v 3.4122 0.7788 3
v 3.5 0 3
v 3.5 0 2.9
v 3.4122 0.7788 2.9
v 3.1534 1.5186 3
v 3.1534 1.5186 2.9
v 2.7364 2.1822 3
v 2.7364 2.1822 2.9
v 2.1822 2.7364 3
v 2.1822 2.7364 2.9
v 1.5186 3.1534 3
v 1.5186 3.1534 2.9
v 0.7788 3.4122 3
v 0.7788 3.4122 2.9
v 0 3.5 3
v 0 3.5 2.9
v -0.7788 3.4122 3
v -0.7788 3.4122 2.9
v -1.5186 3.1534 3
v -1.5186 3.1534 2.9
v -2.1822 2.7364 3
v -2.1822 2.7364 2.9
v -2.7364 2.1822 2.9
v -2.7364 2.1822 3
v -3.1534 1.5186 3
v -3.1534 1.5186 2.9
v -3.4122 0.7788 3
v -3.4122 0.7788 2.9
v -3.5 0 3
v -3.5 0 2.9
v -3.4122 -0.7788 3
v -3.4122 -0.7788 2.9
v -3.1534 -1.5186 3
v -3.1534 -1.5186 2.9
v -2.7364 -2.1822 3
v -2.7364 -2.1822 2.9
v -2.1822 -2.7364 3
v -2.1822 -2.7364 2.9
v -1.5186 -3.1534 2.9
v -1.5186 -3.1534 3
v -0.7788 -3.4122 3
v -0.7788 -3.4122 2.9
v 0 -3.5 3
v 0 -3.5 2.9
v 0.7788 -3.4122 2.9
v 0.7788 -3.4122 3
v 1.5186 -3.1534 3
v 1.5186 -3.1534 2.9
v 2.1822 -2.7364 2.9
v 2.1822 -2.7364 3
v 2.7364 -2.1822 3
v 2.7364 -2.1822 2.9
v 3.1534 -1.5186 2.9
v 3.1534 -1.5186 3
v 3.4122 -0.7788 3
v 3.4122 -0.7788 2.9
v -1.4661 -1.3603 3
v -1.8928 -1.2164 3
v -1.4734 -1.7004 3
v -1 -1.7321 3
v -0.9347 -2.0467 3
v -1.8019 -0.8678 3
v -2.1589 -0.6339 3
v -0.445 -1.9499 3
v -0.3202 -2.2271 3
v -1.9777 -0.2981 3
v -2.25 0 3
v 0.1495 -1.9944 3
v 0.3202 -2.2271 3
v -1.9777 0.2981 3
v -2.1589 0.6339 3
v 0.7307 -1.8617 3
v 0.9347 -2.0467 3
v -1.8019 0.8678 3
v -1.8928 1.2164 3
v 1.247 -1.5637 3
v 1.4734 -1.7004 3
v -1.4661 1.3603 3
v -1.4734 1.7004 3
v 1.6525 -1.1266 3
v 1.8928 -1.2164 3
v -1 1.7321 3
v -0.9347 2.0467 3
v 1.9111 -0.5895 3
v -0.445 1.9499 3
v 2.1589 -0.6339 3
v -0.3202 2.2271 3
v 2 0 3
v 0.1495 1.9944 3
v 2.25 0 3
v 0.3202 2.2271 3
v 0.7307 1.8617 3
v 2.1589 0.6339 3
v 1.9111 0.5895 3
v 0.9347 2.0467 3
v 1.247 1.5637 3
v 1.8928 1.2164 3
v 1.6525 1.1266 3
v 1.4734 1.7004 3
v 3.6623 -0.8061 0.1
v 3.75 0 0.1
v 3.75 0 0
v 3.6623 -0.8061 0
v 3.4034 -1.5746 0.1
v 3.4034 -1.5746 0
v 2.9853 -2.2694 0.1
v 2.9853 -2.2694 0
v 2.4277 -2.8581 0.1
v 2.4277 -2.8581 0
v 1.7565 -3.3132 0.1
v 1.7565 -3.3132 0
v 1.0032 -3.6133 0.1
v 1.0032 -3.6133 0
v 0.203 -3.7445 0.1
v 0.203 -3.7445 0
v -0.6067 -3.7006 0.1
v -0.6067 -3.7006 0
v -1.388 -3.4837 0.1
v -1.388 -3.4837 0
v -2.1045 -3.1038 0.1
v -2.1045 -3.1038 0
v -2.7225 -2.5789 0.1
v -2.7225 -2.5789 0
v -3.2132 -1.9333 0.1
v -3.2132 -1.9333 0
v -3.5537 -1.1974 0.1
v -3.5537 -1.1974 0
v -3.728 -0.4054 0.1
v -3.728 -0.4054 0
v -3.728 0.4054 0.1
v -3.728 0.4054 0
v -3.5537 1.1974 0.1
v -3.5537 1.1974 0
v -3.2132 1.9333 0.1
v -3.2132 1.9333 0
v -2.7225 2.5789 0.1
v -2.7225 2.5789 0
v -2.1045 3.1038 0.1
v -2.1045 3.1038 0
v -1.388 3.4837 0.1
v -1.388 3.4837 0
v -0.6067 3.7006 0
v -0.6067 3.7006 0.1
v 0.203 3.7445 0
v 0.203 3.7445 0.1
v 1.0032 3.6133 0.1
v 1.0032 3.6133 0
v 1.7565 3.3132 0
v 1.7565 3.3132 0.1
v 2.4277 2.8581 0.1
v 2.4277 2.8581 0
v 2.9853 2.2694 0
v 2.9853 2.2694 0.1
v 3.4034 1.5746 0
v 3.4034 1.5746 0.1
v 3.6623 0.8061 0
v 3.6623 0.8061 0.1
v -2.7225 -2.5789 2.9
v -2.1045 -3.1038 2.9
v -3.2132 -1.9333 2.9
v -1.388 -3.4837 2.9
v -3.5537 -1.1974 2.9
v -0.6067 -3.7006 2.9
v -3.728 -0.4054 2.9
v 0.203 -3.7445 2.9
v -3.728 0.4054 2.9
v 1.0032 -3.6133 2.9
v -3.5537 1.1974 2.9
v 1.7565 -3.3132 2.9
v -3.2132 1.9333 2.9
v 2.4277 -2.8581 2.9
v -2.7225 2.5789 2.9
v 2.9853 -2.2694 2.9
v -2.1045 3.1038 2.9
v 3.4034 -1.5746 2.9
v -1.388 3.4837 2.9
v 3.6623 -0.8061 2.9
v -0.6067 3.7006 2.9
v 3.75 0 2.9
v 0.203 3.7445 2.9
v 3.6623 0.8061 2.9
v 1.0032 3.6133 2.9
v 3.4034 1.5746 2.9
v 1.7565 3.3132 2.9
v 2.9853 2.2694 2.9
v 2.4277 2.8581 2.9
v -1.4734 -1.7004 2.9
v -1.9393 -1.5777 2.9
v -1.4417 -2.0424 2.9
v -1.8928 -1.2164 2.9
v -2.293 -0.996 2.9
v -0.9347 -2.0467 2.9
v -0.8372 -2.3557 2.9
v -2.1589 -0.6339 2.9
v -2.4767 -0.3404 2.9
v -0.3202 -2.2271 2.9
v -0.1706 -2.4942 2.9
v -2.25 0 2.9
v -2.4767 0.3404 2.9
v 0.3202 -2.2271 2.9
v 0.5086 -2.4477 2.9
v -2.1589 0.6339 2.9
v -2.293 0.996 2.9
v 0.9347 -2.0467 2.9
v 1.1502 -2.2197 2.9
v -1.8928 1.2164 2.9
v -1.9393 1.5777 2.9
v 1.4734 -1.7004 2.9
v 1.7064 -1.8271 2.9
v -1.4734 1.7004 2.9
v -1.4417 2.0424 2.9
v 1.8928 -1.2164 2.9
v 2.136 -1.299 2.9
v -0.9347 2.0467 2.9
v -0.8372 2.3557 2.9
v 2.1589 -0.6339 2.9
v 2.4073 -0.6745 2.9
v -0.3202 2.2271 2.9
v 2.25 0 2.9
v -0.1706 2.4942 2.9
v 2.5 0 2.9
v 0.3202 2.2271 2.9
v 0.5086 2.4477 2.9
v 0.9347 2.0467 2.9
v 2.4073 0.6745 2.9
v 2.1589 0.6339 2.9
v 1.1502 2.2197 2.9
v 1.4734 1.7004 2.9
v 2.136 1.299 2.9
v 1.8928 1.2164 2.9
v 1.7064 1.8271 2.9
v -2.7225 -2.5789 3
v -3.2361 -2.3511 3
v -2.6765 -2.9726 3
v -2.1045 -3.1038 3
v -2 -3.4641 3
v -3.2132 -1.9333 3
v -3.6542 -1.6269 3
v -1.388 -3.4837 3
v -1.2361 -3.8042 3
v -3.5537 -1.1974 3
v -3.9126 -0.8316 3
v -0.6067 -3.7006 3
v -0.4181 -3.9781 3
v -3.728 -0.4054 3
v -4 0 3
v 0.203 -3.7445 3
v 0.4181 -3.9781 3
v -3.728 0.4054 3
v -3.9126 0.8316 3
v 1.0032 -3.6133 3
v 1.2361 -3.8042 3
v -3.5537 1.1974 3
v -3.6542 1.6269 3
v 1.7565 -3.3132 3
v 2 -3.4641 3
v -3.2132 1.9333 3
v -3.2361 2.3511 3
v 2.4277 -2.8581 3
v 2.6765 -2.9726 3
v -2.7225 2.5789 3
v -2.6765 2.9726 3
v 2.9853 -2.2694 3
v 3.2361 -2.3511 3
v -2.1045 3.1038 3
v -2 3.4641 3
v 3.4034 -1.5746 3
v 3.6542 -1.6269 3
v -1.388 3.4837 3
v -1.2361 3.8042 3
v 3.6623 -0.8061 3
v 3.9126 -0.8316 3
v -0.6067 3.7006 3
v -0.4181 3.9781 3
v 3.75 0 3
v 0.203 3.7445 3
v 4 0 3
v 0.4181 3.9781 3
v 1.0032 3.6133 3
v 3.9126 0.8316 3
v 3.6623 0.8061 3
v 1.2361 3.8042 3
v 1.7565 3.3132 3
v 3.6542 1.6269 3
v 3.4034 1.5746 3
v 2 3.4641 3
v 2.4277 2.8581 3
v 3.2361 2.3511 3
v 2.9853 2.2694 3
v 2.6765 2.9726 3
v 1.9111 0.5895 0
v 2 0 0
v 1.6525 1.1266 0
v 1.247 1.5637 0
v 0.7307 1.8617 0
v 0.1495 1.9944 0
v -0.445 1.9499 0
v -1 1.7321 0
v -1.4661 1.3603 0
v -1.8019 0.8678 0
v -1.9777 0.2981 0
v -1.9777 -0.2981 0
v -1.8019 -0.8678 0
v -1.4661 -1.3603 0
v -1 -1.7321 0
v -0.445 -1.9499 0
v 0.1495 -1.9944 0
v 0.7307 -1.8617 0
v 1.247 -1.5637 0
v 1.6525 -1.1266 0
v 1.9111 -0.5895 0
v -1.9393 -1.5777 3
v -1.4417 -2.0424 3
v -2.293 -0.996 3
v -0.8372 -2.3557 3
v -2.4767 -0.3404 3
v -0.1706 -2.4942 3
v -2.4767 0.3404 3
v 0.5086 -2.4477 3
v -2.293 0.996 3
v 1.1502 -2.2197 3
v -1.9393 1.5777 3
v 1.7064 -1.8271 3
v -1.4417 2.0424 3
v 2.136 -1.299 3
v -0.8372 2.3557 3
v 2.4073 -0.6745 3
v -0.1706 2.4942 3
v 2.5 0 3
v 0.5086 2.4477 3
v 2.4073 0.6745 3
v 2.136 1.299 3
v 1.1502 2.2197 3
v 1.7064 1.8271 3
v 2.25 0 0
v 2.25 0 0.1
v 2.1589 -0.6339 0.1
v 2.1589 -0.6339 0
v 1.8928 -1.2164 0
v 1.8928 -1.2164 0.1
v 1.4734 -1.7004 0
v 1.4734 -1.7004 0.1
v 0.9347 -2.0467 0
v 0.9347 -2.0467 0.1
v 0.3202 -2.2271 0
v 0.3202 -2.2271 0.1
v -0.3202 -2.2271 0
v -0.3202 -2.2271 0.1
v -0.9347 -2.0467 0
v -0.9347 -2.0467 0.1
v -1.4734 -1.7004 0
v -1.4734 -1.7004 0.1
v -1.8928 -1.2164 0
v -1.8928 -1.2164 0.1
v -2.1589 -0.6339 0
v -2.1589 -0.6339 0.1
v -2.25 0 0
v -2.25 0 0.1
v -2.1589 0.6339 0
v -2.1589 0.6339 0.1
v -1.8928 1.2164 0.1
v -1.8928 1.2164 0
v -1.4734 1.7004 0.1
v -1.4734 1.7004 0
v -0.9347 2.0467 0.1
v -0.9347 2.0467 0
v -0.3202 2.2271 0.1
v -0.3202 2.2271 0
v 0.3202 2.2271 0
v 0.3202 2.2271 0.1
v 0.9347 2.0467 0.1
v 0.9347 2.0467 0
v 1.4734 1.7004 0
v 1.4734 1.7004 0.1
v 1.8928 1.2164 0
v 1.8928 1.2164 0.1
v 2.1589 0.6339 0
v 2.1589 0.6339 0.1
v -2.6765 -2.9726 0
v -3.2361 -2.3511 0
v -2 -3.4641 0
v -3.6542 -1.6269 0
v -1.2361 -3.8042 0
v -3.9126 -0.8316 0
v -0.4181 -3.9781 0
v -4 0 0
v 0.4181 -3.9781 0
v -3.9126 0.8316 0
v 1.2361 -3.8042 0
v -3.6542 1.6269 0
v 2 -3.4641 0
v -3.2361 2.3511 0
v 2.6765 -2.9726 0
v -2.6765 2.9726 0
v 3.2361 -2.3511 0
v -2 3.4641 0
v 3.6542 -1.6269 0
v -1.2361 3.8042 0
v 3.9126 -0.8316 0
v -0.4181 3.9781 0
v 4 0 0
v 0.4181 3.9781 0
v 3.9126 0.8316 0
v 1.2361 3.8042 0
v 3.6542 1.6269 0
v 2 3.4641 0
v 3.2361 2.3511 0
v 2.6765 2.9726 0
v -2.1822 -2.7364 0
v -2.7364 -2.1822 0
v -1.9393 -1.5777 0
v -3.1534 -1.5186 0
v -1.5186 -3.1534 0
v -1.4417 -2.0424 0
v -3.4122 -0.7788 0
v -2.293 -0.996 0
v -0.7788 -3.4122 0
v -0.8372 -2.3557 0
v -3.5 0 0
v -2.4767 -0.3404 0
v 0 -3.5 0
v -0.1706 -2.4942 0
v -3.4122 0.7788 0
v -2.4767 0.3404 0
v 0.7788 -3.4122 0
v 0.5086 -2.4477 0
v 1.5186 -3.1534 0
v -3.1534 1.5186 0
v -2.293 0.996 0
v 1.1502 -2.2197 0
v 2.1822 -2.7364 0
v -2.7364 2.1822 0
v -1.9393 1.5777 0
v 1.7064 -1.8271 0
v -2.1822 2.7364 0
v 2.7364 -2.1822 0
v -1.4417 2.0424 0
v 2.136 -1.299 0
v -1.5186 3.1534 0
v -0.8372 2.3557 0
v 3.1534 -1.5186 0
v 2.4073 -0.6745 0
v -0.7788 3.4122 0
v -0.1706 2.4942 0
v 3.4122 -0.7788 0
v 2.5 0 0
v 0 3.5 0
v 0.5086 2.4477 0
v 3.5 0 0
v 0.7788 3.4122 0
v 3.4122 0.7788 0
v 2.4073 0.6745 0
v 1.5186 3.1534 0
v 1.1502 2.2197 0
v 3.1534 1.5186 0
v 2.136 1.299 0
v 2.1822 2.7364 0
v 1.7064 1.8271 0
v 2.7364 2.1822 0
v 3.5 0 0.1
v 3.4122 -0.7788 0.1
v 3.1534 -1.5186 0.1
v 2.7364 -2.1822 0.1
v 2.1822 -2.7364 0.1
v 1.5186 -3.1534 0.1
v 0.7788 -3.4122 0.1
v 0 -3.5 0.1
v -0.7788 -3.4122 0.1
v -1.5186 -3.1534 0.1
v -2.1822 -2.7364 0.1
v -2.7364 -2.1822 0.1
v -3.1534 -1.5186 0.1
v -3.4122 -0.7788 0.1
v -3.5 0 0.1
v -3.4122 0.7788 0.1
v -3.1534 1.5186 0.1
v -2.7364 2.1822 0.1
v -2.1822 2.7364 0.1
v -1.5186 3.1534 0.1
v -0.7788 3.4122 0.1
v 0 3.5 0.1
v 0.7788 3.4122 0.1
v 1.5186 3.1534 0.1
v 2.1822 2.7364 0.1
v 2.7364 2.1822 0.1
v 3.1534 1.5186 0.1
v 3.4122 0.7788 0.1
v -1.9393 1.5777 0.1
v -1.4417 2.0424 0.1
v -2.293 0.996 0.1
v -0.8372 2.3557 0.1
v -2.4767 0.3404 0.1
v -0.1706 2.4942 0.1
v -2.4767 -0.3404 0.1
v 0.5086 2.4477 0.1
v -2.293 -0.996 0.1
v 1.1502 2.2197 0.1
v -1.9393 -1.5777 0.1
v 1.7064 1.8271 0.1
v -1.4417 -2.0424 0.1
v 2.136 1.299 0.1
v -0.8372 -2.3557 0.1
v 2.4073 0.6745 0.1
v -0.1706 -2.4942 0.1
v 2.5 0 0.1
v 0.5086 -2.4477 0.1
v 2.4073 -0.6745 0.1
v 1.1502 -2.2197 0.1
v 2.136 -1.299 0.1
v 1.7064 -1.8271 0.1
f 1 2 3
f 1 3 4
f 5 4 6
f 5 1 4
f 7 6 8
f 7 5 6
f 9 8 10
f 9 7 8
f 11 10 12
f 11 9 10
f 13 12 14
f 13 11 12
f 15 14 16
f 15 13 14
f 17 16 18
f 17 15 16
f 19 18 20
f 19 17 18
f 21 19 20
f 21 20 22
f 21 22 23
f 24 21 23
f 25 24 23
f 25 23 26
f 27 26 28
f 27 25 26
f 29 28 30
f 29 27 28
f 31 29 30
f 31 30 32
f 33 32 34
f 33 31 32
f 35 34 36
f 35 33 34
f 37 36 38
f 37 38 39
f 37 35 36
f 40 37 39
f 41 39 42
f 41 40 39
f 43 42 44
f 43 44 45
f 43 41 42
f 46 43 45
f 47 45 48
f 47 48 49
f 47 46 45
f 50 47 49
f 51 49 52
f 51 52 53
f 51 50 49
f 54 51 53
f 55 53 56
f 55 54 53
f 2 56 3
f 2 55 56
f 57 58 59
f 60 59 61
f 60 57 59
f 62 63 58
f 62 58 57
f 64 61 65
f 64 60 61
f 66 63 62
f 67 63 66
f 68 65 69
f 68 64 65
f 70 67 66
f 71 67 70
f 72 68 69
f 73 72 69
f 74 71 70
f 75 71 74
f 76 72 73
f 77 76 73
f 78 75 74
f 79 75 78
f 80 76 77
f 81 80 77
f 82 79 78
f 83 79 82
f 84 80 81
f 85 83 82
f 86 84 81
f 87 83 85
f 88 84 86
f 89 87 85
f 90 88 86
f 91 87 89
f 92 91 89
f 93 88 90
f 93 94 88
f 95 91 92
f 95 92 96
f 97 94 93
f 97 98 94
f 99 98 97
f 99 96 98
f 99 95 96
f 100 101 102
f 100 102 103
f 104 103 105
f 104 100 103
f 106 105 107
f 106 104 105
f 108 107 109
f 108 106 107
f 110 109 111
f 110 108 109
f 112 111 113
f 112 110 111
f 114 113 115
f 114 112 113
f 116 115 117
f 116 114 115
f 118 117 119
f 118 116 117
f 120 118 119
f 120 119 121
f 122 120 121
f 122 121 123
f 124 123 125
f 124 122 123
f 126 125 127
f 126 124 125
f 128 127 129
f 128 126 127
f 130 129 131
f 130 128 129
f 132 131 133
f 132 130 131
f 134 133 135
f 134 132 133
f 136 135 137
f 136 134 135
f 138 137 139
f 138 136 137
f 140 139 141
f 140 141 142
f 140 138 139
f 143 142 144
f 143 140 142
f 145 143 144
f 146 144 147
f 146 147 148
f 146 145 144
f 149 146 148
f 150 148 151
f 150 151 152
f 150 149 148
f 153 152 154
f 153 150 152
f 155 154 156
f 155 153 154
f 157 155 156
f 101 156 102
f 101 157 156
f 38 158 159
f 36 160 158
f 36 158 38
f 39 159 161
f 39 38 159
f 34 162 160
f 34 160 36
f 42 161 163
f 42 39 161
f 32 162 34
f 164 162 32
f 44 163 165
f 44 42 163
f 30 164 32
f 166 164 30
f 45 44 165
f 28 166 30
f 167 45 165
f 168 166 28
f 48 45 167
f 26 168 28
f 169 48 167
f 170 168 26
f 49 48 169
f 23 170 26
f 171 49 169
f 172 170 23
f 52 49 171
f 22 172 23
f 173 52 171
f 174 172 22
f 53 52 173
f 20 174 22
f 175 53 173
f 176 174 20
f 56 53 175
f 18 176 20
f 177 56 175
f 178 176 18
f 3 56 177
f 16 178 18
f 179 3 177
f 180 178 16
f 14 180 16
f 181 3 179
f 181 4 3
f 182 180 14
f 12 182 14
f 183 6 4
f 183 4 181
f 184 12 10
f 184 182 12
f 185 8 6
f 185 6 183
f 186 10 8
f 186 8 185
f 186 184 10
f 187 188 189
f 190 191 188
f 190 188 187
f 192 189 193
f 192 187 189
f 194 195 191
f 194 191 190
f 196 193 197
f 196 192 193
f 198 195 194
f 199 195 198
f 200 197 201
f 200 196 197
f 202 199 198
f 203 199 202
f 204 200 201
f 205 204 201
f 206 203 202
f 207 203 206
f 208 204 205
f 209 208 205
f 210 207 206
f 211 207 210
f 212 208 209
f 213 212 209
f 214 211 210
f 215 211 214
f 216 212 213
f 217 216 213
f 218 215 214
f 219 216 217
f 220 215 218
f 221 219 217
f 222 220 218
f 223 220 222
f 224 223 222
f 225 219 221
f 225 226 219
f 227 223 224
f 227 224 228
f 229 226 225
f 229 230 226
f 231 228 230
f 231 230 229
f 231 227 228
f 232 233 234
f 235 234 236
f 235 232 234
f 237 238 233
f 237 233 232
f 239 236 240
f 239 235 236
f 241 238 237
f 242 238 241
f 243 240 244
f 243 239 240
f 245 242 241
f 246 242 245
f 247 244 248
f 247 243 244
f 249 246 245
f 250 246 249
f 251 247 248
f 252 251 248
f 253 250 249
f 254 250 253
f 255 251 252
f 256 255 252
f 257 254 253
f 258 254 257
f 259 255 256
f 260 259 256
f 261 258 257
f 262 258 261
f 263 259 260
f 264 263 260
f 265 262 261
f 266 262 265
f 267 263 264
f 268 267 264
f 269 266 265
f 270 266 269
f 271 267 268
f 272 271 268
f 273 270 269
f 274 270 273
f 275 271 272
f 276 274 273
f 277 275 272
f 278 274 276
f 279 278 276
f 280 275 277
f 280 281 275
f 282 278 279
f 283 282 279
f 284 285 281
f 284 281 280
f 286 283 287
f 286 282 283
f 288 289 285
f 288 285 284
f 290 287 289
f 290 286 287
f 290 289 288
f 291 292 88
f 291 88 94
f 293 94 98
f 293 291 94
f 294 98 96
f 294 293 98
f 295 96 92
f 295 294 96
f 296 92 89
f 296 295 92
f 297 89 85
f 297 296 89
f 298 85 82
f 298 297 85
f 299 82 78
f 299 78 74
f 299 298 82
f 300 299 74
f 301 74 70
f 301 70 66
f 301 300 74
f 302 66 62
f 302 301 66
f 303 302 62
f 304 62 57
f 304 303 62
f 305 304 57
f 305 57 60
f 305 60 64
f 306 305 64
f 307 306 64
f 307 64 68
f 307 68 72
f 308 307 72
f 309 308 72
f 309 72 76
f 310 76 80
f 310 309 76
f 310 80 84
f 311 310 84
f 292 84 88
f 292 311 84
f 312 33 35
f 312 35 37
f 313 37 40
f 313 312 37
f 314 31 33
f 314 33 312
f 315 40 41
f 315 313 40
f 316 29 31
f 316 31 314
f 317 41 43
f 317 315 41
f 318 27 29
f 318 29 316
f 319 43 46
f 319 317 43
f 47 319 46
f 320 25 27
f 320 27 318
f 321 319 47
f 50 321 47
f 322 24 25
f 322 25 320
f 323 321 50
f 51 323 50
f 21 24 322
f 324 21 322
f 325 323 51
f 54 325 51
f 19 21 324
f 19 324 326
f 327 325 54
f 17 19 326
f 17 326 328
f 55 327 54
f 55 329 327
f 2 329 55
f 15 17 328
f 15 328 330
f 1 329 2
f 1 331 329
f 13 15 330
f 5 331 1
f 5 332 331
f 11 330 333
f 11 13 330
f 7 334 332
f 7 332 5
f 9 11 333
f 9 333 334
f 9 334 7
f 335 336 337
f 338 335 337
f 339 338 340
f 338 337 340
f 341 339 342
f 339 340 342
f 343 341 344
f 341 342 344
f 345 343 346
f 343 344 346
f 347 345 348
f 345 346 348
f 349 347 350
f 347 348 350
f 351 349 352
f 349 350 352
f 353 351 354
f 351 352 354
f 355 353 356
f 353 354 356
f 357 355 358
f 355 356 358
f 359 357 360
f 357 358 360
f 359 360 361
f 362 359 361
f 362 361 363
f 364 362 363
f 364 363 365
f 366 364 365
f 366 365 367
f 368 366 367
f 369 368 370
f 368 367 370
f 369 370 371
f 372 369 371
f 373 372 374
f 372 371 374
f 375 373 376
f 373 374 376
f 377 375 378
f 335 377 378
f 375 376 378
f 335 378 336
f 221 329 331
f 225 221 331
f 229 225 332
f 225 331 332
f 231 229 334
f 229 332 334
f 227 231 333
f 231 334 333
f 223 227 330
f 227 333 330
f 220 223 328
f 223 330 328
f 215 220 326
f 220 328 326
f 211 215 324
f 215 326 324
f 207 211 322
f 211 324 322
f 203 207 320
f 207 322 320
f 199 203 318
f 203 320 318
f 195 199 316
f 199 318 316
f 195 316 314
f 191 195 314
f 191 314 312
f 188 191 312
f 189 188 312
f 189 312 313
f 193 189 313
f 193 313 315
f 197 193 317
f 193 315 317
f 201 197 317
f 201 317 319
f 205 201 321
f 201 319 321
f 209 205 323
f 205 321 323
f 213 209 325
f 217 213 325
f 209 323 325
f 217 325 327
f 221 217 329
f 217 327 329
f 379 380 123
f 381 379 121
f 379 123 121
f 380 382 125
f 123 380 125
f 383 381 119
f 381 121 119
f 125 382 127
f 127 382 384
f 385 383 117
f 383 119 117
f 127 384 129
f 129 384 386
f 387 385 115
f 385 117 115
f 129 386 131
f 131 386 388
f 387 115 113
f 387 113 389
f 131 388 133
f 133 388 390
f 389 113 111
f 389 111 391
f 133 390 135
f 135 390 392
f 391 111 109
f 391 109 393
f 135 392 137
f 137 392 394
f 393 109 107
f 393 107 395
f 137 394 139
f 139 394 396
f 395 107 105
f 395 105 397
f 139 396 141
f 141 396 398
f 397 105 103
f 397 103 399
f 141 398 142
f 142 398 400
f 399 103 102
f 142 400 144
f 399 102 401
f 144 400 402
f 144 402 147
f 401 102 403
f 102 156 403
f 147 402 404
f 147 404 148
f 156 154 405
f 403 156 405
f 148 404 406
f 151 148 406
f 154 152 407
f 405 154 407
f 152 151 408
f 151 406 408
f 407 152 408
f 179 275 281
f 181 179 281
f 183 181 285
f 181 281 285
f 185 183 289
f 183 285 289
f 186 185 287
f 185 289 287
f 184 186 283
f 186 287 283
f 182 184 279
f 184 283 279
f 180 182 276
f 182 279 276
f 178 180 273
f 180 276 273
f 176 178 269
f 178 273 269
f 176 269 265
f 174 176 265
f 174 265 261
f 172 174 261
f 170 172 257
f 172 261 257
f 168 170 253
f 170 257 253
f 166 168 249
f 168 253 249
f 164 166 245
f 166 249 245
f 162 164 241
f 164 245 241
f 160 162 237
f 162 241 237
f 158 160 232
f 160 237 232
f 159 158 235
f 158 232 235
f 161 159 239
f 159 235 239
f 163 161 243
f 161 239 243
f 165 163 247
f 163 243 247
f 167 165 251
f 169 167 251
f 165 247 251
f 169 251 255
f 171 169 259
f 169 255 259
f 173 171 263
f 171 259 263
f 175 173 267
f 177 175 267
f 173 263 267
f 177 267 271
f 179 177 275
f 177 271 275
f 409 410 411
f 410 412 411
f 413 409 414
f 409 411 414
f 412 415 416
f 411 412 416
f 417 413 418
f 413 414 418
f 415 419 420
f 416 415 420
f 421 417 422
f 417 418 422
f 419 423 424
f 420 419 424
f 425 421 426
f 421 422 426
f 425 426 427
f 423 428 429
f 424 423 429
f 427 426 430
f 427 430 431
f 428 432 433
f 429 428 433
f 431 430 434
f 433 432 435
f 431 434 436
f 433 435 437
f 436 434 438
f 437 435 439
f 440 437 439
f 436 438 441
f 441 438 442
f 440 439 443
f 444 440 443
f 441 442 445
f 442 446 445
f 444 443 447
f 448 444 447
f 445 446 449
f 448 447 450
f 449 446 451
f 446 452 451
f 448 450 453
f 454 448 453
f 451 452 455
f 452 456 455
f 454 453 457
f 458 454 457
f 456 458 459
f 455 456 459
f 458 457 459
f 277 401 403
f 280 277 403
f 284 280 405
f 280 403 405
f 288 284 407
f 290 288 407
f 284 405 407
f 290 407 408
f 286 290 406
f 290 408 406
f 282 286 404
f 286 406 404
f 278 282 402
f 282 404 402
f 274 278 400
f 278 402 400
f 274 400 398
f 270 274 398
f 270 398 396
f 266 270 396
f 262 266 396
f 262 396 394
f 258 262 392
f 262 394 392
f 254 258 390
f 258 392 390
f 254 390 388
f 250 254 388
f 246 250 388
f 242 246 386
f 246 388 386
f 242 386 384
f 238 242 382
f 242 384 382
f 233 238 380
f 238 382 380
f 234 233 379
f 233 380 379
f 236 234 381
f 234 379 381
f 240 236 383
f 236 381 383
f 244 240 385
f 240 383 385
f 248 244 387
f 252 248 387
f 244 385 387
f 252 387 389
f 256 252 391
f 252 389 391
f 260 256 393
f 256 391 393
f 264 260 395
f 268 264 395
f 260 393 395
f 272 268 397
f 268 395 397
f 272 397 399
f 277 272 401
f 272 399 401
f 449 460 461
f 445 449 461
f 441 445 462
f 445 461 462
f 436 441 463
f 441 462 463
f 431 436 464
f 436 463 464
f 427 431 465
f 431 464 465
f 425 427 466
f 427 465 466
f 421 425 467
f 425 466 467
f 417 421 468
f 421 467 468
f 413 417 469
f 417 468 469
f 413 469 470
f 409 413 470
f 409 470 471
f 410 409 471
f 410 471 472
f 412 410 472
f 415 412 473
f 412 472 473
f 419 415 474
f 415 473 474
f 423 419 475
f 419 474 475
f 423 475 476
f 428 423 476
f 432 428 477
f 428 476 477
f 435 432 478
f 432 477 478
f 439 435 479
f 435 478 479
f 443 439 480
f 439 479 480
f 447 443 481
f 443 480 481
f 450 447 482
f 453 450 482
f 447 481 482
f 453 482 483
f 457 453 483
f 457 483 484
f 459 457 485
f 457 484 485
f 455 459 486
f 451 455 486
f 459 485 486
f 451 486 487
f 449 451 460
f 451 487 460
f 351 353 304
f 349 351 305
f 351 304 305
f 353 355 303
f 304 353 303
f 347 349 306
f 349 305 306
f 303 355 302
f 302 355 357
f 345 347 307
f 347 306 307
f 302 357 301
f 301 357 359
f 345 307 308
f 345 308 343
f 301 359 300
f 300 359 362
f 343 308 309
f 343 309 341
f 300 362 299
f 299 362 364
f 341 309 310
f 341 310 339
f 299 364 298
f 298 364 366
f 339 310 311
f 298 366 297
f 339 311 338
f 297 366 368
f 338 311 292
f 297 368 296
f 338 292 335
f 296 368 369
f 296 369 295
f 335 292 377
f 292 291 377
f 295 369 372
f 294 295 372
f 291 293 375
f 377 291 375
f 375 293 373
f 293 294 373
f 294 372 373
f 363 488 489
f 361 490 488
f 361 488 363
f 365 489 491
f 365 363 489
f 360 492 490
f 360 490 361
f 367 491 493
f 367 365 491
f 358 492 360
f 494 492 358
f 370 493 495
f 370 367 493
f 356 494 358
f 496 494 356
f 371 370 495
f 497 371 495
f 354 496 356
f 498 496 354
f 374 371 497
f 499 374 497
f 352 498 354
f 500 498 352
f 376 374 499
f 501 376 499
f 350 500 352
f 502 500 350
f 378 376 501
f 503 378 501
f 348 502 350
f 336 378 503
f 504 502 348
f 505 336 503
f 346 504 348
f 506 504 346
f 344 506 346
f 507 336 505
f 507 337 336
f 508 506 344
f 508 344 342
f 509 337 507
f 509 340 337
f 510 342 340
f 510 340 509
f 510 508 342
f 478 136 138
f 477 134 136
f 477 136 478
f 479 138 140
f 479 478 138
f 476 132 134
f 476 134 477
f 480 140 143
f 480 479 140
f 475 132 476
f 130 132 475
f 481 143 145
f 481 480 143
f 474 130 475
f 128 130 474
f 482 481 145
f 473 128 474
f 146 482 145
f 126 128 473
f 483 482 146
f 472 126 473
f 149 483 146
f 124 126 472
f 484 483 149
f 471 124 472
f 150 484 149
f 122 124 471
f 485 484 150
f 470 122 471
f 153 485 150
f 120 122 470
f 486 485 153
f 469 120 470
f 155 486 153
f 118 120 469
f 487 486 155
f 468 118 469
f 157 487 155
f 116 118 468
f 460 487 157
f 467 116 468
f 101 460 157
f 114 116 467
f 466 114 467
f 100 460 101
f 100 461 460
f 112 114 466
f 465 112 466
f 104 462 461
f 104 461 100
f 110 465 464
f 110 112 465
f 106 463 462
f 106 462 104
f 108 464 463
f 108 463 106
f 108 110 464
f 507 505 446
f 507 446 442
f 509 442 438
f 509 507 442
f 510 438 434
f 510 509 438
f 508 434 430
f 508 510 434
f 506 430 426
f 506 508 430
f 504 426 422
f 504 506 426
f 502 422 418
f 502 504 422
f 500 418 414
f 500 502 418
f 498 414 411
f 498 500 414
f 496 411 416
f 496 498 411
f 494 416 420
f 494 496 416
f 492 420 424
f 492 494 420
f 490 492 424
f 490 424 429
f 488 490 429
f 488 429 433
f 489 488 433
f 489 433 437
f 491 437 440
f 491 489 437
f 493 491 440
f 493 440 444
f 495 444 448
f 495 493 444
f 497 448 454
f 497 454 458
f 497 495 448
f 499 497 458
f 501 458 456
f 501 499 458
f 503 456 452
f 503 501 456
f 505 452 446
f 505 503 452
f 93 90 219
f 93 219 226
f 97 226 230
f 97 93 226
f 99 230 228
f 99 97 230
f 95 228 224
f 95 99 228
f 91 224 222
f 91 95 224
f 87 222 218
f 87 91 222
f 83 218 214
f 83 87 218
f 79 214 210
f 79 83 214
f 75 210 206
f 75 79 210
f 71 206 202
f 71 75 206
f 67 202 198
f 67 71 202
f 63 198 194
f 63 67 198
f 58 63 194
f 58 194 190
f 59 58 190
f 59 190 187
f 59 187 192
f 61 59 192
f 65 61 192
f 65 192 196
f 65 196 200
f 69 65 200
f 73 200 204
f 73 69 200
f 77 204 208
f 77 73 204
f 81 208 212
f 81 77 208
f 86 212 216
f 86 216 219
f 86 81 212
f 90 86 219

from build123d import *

# Parameters (mm, degrees)
SKETCH_1_R          = 4
SKETCH_1_R_2        = 2
EXTRUDE_1_DEPTH     = 3
SKETCH_2_R          = 3.75
SKETCH_2_R_2        = 3.5
SKETCH_2_R_3        = 2.5
SKETCH_2_R_4        = 2.25
CUT_EXTRUDE_1_DEPTH = 0.1
CUT_EXTRUDE_START   = -0.1
SKETCH_3_R          = 3.75
SKETCH_3_R_2        = 3.5
SKETCH_3_R_3        = 2.5
SKETCH_3_R_4        = 2.25
CUT_EXTRUDE_2_DEPTH = 0.1


with BuildPart() as part:
    # 草图1 → 凸台-拉伸1 (new body)
    with BuildSketch(Plane.XY):
        Circle(SKETCH_1_R)
        Circle(SKETCH_1_R_2, mode=Mode.SUBTRACT)
    extrude(amount=EXTRUDE_1_DEPTH)

    # 草图2 → 切除-拉伸1 (cut)
    # profile 1 of 2: a face of its own
    with BuildSketch(Plane.XY.offset(3)):
        Circle(SKETCH_2_R)
        Circle(SKETCH_2_R_2, mode=Mode.SUBTRACT)
    # profile 2 of 2: a face of its own
    with BuildSketch(Plane.XY.offset(3)):
        Circle(SKETCH_2_R_3)
        Circle(SKETCH_2_R_4, mode=Mode.SUBTRACT)
    extrude(amount=-CUT_EXTRUDE_1_DEPTH, mode=Mode.SUBTRACT)

    # 草图3 → 切除-拉伸2 (cut)
    # profile 1 of 2: a face of its own
    with BuildSketch(Plane(origin=(0, 0, 0), x_dir=(-1, 0, 0), z_dir=(0, 0, -1)).offset(CUT_EXTRUDE_START)):
        with Locations(Location((0, 0, 0), (0, 0, 180))):
            Circle(SKETCH_3_R)
        with Locations(Location((0, 0, 0), (0, 0, 180))):
            Circle(SKETCH_3_R_2, mode=Mode.SUBTRACT)
    # profile 2 of 2: a face of its own
    with BuildSketch(Plane(origin=(0, 0, 0), x_dir=(-1, 0, 0), z_dir=(0, 0, -1)).offset(CUT_EXTRUDE_START)):
        with Locations(Location((0, 0, 0), (0, 0, 180))):
            Circle(SKETCH_3_R_3)
        with Locations(Location((0, 0, 0), (0, 0, 180))):
            Circle(SKETCH_3_R_4, mode=Mode.SUBTRACT)
    extrude(amount=CUT_EXTRUDE_2_DEPTH, mode=Mode.SUBTRACT)


solid = part.part
